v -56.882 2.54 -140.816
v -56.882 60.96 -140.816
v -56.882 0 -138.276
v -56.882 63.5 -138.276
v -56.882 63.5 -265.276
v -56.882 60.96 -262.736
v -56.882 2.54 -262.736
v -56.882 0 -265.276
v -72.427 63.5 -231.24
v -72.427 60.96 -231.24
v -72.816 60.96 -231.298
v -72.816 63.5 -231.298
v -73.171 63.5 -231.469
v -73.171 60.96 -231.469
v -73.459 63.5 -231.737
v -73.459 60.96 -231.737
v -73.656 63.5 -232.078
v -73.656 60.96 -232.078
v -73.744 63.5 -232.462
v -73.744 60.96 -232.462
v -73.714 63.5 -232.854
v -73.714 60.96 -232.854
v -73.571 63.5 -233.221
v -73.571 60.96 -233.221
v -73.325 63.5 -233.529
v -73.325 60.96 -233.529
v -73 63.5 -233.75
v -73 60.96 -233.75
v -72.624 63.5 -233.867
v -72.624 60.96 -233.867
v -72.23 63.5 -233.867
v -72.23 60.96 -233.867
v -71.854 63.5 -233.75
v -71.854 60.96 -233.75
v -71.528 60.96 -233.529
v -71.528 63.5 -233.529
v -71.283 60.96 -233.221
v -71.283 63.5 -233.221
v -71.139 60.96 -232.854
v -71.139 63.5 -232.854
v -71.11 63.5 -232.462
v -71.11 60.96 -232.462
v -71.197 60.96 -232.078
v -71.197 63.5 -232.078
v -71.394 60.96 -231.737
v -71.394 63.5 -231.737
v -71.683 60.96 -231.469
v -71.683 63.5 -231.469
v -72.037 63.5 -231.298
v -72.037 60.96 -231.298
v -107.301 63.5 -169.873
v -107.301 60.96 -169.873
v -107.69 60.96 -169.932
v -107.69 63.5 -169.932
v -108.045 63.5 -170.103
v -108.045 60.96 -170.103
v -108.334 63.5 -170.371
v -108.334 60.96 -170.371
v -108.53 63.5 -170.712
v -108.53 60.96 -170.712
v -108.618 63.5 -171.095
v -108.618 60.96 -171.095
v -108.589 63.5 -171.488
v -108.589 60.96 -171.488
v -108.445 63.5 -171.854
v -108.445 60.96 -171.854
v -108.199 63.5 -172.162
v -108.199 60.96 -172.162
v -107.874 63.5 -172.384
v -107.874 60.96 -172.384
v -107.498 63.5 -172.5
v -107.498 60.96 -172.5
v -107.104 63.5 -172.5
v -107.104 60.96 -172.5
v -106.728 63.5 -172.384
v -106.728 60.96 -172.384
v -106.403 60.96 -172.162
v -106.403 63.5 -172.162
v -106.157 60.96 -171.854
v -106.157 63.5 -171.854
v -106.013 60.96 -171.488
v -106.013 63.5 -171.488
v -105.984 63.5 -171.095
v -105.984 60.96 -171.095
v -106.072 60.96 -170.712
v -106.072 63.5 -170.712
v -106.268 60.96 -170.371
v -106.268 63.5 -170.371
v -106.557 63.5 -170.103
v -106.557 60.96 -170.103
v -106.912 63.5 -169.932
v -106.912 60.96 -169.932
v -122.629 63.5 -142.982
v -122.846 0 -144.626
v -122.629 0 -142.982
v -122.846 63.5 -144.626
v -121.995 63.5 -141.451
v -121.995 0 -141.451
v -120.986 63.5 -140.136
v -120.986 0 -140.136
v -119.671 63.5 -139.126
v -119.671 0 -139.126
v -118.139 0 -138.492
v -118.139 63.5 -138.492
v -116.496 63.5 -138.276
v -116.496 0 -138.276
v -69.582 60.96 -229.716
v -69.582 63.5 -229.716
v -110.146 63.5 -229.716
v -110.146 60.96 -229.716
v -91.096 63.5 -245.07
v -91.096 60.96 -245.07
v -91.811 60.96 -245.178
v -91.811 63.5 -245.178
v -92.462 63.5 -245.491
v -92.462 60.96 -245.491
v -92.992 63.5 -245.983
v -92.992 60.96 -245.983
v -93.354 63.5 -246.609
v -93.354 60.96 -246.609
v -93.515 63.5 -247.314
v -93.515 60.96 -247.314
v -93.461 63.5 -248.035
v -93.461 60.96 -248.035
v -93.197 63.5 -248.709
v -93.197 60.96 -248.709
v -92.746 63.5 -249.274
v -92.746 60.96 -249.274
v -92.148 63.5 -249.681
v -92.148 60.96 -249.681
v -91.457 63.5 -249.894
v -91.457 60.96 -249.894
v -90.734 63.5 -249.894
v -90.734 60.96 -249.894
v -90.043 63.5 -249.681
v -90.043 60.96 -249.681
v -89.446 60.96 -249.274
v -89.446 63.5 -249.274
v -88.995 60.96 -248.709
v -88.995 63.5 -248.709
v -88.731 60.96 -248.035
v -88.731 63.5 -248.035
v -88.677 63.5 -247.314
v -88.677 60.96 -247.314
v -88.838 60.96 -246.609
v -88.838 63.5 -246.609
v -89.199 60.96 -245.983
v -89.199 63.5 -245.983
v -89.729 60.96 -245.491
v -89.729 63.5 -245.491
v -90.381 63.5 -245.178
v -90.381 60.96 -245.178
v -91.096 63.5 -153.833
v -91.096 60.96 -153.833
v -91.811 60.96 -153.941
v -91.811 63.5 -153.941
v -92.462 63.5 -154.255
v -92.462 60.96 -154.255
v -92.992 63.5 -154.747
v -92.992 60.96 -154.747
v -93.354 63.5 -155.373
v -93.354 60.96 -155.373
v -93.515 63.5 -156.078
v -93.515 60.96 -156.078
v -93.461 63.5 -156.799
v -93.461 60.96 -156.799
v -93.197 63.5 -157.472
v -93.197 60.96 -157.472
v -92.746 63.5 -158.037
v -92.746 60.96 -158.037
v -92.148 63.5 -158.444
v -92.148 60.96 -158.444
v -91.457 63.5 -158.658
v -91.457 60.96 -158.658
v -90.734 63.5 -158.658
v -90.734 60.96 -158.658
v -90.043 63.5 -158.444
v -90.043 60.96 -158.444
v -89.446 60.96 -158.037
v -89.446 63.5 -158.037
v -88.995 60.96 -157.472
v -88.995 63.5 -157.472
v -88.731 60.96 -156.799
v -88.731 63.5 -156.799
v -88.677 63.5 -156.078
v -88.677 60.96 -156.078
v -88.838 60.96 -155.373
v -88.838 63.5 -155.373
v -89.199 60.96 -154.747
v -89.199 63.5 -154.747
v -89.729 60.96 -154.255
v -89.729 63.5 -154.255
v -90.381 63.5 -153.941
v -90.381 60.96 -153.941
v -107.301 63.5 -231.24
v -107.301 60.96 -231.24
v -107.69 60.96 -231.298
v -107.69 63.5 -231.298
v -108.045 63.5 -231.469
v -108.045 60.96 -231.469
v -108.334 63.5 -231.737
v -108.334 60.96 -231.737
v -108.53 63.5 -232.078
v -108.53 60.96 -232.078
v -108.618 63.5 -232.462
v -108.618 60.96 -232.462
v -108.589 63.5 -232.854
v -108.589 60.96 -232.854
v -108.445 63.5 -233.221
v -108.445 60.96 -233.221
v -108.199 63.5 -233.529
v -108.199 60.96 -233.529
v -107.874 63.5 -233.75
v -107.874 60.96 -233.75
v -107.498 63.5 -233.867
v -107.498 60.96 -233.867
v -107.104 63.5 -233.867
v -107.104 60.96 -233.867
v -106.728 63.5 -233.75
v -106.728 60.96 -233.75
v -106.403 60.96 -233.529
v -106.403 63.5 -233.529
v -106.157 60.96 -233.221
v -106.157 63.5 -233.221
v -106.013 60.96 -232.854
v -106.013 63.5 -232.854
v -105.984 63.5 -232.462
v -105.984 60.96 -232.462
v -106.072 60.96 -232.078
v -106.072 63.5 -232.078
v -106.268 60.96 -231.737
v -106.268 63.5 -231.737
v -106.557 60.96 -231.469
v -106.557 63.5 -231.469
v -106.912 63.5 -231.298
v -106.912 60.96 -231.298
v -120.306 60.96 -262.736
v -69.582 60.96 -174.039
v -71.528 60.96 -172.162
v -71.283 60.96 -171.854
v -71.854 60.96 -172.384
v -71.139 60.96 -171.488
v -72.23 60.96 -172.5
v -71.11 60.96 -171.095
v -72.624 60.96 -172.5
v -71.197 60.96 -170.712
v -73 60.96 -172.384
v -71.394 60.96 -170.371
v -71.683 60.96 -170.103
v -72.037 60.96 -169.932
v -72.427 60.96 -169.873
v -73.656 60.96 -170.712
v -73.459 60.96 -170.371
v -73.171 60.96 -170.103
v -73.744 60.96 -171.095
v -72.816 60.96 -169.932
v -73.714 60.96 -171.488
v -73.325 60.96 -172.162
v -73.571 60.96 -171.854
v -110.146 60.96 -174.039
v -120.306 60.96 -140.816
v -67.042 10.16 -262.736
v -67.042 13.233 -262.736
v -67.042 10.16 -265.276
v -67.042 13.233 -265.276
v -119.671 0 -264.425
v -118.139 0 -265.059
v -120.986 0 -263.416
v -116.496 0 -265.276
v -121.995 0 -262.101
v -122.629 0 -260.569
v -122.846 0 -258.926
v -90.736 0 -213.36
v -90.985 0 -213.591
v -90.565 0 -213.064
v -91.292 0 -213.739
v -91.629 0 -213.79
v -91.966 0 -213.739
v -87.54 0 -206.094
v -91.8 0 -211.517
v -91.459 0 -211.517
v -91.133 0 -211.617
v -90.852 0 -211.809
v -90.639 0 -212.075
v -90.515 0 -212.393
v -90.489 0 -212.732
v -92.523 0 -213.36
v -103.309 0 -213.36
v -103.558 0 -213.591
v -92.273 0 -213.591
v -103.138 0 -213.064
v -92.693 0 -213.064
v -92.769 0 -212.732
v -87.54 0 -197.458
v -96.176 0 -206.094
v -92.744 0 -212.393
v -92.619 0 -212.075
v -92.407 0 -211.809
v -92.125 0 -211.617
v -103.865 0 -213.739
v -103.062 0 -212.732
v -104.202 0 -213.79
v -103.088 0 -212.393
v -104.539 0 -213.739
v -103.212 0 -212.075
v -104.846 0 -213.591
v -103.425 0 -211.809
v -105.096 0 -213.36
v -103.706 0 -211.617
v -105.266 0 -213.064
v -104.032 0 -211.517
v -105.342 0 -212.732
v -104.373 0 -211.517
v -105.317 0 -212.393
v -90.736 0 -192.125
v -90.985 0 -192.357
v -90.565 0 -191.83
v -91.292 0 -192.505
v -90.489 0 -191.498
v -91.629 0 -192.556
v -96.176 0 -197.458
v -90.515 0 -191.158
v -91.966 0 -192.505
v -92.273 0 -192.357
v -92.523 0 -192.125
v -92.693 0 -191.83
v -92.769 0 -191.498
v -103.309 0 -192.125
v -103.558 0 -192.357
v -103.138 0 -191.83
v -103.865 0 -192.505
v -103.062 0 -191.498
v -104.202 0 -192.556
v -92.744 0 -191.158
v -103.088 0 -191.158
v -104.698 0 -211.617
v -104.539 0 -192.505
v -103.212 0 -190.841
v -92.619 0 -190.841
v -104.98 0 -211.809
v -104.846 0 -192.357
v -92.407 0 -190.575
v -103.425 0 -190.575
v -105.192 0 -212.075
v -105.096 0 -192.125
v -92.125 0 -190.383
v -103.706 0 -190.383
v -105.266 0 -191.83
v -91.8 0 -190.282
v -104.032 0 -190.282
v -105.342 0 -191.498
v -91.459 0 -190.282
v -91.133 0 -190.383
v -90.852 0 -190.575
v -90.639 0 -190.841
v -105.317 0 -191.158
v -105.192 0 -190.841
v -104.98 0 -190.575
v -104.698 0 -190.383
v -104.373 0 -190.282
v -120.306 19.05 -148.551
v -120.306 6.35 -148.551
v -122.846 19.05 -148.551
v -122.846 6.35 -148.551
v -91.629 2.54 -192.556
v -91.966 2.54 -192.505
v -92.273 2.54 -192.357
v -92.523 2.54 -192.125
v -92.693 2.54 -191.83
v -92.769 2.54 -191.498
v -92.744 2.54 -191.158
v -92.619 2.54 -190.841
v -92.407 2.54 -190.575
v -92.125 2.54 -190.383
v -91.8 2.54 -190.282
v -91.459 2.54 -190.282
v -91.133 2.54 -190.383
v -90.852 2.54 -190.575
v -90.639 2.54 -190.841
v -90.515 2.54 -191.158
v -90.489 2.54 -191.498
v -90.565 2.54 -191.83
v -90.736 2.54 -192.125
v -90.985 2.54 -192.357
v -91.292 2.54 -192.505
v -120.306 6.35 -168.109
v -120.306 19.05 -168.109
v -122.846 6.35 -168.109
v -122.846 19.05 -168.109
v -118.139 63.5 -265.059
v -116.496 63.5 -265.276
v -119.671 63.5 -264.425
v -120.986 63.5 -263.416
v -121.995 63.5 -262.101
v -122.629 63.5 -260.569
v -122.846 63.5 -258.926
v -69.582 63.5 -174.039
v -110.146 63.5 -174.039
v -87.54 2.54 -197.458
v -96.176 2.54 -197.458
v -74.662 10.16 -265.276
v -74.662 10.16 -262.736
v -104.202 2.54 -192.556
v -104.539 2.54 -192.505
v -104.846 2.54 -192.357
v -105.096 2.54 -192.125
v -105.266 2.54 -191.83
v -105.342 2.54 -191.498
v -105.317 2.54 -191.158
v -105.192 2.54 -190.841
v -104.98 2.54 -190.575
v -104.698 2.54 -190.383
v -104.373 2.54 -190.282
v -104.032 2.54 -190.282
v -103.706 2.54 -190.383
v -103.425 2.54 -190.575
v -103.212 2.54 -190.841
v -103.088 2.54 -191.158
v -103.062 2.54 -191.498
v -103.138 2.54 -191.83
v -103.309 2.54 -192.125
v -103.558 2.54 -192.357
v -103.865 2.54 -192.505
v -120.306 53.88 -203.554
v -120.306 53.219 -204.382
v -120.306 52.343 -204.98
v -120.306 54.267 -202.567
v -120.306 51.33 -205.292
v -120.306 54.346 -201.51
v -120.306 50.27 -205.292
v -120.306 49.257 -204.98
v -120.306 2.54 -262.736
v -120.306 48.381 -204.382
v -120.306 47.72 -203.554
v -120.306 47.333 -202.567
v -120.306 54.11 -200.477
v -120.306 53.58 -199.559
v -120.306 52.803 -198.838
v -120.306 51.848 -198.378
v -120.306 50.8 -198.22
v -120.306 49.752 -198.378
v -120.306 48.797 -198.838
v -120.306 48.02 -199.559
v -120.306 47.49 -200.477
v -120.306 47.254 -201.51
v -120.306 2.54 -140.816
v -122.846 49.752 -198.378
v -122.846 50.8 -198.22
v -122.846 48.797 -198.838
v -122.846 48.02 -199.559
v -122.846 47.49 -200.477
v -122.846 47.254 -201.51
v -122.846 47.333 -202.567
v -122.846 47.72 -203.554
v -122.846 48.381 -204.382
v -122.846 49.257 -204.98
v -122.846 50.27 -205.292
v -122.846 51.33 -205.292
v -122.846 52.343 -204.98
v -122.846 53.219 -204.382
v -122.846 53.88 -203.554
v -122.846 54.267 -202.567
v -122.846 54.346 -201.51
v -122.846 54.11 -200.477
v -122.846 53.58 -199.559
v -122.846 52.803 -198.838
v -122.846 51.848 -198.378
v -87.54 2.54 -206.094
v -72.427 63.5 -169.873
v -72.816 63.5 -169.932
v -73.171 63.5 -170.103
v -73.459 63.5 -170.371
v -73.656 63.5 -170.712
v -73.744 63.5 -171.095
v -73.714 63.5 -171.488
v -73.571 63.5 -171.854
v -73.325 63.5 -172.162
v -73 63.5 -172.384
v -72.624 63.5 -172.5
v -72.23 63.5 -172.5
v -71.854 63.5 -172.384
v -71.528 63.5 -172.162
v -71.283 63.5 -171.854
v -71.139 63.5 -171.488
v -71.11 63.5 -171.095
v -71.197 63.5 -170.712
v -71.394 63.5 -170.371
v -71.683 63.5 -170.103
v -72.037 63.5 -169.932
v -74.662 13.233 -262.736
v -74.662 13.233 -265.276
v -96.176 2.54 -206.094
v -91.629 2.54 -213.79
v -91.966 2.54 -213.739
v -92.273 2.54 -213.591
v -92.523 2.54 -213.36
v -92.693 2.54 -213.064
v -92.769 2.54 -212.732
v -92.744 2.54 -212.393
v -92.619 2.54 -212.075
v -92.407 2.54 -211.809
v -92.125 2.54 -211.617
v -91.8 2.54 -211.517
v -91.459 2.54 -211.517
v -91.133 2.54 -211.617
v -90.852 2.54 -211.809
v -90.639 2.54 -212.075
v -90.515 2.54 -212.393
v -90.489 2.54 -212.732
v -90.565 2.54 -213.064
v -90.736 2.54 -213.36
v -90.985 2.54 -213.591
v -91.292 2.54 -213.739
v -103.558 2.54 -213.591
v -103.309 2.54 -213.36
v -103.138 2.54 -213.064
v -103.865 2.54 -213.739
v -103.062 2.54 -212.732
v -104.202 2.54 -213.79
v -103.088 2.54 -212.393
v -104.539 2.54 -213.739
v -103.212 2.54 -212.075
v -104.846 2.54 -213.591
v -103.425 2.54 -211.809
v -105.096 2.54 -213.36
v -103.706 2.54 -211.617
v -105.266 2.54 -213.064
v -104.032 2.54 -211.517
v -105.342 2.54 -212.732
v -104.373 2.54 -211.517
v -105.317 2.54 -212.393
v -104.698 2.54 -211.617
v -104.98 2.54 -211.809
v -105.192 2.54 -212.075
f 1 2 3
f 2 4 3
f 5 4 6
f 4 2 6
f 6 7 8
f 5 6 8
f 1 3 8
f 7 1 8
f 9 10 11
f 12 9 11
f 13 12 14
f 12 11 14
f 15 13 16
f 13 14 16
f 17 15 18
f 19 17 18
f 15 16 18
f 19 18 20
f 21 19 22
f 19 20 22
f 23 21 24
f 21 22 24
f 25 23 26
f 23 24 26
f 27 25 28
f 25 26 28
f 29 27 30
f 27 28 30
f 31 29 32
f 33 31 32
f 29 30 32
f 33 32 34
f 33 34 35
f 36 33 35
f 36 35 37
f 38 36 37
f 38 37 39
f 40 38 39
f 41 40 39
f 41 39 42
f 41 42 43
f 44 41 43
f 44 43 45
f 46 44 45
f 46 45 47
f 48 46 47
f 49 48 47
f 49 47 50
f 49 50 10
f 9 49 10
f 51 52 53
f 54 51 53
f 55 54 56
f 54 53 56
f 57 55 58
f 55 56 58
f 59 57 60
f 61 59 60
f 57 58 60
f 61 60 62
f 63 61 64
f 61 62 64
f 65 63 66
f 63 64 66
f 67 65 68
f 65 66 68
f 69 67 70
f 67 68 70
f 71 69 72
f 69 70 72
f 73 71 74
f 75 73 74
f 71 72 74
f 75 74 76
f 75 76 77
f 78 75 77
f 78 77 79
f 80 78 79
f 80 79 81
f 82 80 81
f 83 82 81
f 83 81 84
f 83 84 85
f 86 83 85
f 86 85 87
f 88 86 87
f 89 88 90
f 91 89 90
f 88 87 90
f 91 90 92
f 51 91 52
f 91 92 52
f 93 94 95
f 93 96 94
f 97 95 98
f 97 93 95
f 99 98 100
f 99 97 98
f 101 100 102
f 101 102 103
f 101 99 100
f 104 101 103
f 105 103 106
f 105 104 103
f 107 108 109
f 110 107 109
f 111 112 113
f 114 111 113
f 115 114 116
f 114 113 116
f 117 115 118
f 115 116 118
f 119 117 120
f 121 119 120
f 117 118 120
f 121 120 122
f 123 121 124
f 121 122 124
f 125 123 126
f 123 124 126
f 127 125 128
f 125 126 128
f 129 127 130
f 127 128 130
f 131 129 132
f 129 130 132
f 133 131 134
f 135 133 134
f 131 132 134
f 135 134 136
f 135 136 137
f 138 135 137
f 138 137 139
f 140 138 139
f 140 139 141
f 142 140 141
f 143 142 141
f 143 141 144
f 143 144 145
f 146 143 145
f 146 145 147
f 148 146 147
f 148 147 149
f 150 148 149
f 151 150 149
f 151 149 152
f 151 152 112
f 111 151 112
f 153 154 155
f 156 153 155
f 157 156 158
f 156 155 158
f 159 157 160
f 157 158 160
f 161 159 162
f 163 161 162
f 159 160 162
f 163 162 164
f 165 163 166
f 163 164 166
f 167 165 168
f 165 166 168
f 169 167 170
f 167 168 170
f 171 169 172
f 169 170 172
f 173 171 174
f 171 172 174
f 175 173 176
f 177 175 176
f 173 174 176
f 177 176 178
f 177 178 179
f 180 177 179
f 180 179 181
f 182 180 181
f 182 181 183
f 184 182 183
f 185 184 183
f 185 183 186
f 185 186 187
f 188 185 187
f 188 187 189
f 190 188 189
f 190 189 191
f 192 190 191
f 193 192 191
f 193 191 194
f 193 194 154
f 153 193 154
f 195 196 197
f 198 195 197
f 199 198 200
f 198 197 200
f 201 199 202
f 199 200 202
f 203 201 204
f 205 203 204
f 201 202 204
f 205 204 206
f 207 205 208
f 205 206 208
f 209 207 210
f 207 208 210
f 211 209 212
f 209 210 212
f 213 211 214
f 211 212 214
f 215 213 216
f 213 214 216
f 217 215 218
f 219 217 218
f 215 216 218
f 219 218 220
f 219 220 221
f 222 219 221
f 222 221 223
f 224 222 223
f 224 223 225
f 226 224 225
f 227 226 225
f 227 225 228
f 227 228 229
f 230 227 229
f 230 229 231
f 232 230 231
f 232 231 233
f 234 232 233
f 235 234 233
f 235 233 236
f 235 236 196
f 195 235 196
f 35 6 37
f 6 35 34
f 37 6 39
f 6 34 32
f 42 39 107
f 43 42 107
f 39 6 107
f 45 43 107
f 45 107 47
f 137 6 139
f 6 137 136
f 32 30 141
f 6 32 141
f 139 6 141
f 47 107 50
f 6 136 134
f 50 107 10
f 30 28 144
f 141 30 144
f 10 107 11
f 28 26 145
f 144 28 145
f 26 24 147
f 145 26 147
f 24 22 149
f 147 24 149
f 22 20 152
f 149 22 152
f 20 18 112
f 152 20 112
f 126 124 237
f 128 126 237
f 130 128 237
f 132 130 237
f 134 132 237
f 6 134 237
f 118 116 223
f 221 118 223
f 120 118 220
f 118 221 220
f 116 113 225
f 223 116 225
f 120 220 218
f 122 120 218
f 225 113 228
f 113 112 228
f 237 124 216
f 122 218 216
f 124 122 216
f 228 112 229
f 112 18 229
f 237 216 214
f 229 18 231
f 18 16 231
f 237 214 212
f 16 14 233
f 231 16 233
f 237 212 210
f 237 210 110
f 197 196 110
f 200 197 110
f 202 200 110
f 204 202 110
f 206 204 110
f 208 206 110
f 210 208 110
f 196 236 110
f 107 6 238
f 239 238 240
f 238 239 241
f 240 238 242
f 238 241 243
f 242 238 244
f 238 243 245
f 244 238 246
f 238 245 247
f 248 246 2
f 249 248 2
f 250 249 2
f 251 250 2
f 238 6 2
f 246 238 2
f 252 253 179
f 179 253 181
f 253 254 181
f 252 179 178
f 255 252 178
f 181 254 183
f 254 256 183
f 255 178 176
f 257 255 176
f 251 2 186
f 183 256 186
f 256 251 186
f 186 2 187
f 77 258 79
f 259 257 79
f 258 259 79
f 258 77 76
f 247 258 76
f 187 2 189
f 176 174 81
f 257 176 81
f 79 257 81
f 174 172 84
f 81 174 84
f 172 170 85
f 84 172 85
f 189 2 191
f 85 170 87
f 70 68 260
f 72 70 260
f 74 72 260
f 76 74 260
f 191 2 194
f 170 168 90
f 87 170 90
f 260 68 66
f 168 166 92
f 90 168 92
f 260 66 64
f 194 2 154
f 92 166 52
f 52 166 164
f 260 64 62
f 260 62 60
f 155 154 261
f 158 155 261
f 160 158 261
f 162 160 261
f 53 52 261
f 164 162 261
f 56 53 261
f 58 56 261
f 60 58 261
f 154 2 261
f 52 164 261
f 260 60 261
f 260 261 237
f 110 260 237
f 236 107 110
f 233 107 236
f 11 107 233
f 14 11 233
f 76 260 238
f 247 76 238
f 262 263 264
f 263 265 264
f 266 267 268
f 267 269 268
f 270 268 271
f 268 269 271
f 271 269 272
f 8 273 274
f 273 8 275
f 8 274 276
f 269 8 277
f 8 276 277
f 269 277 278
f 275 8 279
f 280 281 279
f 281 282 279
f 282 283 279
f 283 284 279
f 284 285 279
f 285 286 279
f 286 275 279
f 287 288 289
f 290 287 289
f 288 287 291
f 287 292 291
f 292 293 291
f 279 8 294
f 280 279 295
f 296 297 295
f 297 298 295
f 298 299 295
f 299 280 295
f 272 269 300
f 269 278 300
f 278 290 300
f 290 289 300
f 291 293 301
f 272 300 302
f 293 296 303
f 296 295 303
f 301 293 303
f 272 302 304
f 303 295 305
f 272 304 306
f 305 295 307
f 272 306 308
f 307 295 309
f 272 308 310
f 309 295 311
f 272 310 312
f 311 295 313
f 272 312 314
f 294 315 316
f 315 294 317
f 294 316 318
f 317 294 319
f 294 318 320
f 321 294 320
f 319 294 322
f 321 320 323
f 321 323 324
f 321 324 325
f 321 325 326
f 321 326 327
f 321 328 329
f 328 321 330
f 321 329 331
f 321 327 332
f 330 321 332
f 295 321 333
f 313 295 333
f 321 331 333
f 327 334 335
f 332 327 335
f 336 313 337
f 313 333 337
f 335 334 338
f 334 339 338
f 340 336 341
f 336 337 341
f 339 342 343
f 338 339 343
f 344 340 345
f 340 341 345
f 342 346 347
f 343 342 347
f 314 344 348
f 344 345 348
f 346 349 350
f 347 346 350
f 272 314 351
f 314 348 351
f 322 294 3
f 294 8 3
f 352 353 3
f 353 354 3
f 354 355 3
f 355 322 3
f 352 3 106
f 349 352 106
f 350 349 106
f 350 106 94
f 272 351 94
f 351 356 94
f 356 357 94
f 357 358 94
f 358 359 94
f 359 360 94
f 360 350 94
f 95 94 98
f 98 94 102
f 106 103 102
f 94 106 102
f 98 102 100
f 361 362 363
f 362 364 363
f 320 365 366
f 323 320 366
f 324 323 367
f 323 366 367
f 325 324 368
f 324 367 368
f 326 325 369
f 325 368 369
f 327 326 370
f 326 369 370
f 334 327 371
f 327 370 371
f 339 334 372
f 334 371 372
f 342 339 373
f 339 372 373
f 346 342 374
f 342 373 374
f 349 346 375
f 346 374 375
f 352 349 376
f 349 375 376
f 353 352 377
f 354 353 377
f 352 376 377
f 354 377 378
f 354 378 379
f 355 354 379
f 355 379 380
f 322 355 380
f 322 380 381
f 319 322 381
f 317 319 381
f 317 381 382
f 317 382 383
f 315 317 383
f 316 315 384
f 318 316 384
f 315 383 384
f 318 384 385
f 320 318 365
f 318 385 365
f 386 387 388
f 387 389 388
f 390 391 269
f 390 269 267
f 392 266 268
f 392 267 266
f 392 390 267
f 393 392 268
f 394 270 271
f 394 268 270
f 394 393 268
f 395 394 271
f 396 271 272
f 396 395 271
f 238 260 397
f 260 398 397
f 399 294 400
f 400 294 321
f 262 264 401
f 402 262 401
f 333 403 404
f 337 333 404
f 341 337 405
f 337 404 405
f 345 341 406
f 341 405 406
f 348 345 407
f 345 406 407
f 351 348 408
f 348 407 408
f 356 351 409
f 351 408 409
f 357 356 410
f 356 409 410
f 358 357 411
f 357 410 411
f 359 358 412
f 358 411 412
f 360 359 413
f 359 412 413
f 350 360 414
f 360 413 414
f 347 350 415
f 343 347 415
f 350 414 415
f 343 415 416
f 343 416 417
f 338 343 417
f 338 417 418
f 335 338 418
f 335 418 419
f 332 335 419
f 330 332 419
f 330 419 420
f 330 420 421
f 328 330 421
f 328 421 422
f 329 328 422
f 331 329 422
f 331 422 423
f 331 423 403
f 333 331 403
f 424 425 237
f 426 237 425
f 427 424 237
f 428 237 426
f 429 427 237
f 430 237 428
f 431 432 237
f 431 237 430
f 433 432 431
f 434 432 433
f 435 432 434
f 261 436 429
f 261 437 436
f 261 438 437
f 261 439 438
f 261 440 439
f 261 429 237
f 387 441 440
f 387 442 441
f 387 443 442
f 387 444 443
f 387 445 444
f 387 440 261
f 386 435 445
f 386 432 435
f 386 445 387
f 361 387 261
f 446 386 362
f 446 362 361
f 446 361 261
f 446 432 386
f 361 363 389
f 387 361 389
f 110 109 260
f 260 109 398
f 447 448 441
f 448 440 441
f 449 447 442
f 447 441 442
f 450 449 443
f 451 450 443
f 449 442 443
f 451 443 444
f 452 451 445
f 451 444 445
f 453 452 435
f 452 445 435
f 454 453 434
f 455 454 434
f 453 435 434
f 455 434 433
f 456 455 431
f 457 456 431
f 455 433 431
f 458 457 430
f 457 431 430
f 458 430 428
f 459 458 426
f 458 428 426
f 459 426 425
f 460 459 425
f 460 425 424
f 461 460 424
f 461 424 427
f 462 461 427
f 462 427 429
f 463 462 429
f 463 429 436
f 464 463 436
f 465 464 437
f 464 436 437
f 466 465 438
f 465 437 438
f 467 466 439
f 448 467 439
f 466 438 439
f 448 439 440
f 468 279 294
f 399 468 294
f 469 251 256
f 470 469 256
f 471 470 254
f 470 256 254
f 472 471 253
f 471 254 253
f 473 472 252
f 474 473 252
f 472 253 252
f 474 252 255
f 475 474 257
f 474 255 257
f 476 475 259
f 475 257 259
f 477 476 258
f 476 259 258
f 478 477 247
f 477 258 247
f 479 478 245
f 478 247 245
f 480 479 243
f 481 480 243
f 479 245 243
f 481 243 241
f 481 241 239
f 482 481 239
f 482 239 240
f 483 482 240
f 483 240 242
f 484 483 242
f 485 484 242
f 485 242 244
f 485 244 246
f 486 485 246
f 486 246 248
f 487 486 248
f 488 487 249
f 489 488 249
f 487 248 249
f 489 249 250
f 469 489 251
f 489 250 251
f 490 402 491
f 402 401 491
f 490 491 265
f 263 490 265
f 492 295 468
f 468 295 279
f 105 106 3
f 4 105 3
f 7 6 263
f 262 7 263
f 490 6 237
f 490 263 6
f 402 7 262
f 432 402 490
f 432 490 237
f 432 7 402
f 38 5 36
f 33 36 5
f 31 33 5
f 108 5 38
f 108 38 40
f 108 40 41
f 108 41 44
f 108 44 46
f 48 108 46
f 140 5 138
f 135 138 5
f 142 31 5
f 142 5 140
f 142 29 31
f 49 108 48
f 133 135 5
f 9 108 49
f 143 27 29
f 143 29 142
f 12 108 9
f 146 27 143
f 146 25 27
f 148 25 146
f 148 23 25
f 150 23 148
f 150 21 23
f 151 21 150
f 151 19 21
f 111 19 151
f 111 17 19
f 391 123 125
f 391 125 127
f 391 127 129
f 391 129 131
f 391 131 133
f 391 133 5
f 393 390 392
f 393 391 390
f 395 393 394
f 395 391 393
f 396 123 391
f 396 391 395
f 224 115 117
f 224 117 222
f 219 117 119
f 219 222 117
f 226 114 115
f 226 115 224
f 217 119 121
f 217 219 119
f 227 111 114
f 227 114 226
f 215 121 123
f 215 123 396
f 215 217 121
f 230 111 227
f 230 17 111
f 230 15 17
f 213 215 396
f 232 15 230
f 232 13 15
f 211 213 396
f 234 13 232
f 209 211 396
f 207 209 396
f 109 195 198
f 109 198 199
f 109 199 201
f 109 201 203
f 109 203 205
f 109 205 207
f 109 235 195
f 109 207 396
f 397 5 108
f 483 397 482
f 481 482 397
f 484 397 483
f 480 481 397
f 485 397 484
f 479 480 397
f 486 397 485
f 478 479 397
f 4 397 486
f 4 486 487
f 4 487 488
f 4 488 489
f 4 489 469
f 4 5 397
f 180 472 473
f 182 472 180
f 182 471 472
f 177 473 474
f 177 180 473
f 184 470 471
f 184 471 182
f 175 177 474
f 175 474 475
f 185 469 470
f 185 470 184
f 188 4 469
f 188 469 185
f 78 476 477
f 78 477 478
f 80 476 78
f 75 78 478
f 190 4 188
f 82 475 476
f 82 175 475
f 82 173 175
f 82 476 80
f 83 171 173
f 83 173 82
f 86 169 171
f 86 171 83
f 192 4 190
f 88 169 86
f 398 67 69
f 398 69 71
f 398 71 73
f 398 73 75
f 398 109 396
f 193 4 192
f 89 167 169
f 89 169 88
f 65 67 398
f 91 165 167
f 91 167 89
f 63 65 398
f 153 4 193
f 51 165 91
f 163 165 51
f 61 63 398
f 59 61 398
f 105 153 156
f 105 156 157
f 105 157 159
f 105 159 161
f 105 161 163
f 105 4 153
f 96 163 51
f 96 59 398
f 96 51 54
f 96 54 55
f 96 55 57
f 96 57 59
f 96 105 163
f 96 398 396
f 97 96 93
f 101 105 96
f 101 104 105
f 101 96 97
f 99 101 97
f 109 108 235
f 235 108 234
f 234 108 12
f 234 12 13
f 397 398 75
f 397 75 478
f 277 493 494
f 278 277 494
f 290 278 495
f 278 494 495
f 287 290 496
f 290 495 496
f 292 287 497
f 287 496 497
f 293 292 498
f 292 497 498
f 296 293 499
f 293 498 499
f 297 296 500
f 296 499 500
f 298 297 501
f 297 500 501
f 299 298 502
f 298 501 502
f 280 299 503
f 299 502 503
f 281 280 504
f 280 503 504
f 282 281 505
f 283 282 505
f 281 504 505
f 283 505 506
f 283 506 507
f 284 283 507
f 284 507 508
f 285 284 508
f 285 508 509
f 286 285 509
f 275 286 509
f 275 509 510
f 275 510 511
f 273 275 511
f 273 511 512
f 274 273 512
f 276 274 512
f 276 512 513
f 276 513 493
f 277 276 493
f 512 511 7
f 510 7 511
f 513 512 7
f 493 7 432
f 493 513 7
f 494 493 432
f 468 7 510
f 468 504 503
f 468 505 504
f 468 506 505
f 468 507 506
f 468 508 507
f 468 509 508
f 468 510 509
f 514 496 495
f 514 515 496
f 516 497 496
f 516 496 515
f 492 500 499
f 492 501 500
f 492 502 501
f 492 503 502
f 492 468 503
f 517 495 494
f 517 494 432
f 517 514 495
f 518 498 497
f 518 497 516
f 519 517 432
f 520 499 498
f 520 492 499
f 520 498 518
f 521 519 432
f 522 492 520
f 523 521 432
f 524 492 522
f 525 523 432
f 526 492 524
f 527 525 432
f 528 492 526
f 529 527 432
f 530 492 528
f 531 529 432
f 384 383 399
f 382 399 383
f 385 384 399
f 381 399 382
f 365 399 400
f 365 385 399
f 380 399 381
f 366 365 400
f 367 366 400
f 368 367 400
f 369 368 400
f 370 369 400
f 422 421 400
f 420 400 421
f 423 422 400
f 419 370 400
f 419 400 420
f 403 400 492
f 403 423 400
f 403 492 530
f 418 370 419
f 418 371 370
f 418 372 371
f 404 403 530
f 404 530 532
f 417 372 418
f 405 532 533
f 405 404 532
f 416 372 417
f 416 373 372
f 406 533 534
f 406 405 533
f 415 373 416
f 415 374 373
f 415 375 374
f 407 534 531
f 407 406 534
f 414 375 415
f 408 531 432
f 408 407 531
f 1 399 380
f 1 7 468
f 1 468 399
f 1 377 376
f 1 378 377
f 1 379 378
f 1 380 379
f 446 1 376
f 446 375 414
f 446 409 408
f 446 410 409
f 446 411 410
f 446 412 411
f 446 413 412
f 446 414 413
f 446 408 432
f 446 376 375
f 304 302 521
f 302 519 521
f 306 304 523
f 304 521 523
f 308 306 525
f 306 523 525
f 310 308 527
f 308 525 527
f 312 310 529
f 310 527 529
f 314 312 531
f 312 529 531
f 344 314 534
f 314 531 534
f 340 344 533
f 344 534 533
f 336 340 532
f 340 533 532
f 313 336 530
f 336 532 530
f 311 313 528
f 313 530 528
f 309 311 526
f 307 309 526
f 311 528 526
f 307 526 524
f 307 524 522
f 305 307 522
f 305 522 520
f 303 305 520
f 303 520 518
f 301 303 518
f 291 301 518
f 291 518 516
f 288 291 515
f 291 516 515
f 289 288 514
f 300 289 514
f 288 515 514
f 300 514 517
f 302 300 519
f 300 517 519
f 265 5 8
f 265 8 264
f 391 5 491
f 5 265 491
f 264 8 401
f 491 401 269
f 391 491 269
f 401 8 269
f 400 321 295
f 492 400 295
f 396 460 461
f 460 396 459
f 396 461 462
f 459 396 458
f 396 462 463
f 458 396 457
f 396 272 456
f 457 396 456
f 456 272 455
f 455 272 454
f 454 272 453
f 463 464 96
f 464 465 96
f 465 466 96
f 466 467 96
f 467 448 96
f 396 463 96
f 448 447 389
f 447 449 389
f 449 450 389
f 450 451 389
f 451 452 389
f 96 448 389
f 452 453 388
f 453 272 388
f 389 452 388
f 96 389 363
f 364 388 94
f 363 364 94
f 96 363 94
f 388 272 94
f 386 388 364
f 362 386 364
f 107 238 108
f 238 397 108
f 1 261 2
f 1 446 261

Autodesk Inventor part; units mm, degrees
ref_plane "YZ Plane" through (0, 0, 0) normal (1, 0, 0) x (0, 1, 0)
ref_plane "XZ Plane" through (0, 0, 0) normal (0, 1, 0) x (-1, 0, 0)
ref_plane "XY Plane" through (0, 0, 0) normal (0, 0, 1) x (1, 0, 0)
sketch "Sketch1" plane through (0, 0, 0) normal (0, 1, 0) x (-1, 0, 0)
  line L0 (122.8458, -138.2757) -> (56.882, -138.2757)
  line L1 (56.882, -138.2757) -> (56.882, -265.2757)
  line L2 (56.882, -265.2757) -> (122.8458, -265.2757)
  line L3 (122.8458, -265.2757) -> (122.8458, -138.2757)
  line L4 (110.1458, -173.9373) -> (69.582, -173.9373)
  line L5 (69.582, -173.9373) -> (69.582, -229.6141)
  line L6 (69.582, -229.6141) -> (110.1458, -229.6141)
  line L7 (110.1458, -229.6141) -> (110.1458, -173.9373)
  point P0 (0, 0)
  dimension "d1" = 127
  dimension "d4" = 55.6768
  dimension "d5" = 40.5638
  dimension "d6" = 12.7
  dimension "d7" = 35.6616
  dimension "d8" = 12.7
extrude "Extrusion1" add sketch "Sketch1" along normal blind 63.5 contours L3 L2 L1 L0 | L7 L6 L5 L4
shell "Shell1" thickness 2.54 removed faces 1 at (-56.882, 21.1667, -180.609)
sketch "Sketch3" plane through (0, 63.5, 0) normal (0, 1, 0) x (1, 0, 0)
  line L0 (-110.1458, 174.0389) -> (-69.582, 174.0389)
  line L1 (-69.582, 174.0389) -> (-69.582, 229.7157)
  line L2 (-69.582, 229.7157) -> (-110.1458, 229.7157)
  line L3 (-110.1458, 229.7157) -> (-110.1458, 174.0389)
  line L4 (-122.8458, 265.2757) -> (-122.8458, 138.2757) projected
  line L5 (-56.882, 265.2757) -> (-122.8458, 265.2757) projected
  point P0 (0, 0)
  dimension "d14" = 55.6768
  dimension "d15" = 40.5638
  dimension "d16" = 12.7
  dimension "d17" = 35.56
extrude "Extrusion2" cut sketch "Sketch3" against normal blind 12.7
sketch "Sketch4" plane through (0, 63.5, 0) normal (0, 1, 0) x (1, 0, 0)
  circle A0 centre (-91.0958, 156.2589) radius 2.4257
  line L0 (-69.582, 174.0389) -> (-110.1458, 174.0389) projected
  line L1 (-122.8458, 265.2757) -> (-122.8458, 138.2757) projected
  line L2 (-122.8458, 138.2757) -> (-56.882, 138.2757) projected
  line L3 (-69.582, 229.7157) -> (-69.582, 174.0389) projected
  line L4 (-69.582, 174.0389) -> (-110.1458, 174.0389) projected
  line L5 (-110.1458, 174.0389) -> (-110.1458, 229.7157) projected
  line L6 (-110.1458, 229.7157) -> (-69.582, 229.7157) projected
  line L7 (-122.8458, 138.2757) -> (-56.882, 138.2757) projected
  line L8 (-56.882, 138.2757) -> (-56.882, 265.2757) projected
  line L9 (-56.882, 265.2757) -> (-122.8458, 265.2757) projected
  line L10 (-122.8458, 265.2757) -> (-122.8458, 138.2757) projected
  circle A1 centre (-91.0958, 247.4957) radius 2.4257
  point P0 (0, 0)
  dimension "d20" = 4.8514
  dimension "d21" = 17.78
  dimension "d22" = 31.75
  dimension "d23" = 4.8514
  dimension "d24" = 17.78
  dimension "d25" = 31.75
hole "Hole1" at (-91.0958, 63.5, -156.2589) at (-91.0958, 63.5, -247.4957) direction (0, -1, 0) diameter 4.8514 depth 12.7 tip angle 118
sketch "Sketch5" plane through (0, 0, 0) normal (0, -1, 0) x (1, 0, 0)
  line L0 (-122.8458, -265.2757) -> (-122.8458, -138.2757) projected
  line L1 (-122.8458, -138.2757) -> (-56.882, -138.2757) projected
  line L2 (-122.8458, -265.2757) -> (-122.8458, -138.2757) projected
  line L3 (-56.882, -265.2757) -> (-122.8458, -265.2757) projected
  line L4 (-56.882, -138.2757) -> (-56.882, -265.2757) projected
  line L5 (-96.1758, -206.0937) -> (-87.5398, -206.0937)
  line L6 (-87.5398, -206.0937) -> (-87.5398, -197.4577)
  line L7 (-87.5398, -197.4577) -> (-96.1758, -197.4577)
  line L8 (-96.1758, -197.4577) -> (-96.1758, -206.0937)
  circle A0 centre (-91.8578, -191.8951) radius 1.0414
  circle A1 centre (-91.8578, -212.4032) radius 1.0826
  point P0 (0, 0)
  dimension "d33" = 8.636
  dimension "d34" = 8.636
  dimension "d35" = 26.67
  dimension "d36" = 59.182
  dimension "d64" = 2.0828
  dimension "d65" = 5.5626
  dimension "d83" = 127
  dimension "d84" = 8.636
extrude "Extrusion3" cut sketch "Sketch5" against normal blind 12.7 contours L8 L7 L6 L5
sketch "Sketch6" plane through (-122.8458, 0, -265.2757) normal (-1, 0, 0) x (0, 0, 1)
  circle A0 centre (63.5, 50.8) radius 3.556
  line L0 (127, 0) -> (127, 63.5) projected
  line L1 (0, 63.5) -> (127, 63.5) projected
  line L2 (116.7244, 19.05) -> (97.1664, 19.05)
  line L3 (97.1664, 19.05) -> (97.1664, 6.35)
  line L4 (97.1664, 6.35) -> (116.7244, 6.35)
  line L5 (116.7244, 6.35) -> (116.7244, 19.05)
  line L6 (0, 0) -> (127, 0) projected
  point P0 (265.2757, 0)
  dimension "d39" = 7.112
  dimension "d40" = 63.5
  dimension "d41" = 12.7
  dimension "d49" = 12.7
  dimension "d50" = 19.558
  dimension "d51" = 6.35
hole "Hole2" at (-122.8458, 50.8, -201.7757) direction (1, 0, 0) diameter 7.112 depth 12.7 tip angle 118
extrude "Extrusion4" cut sketch "Sketch6" against normal blind 12.7 contours L5 L4 L3 L2
fillet "Fillet1" radius 6.35 2 edges at (-122.8458, 31.75, -265.2757) (-122.8458, 31.75, -138.2757)
sketch "Sketch8" plane through (0, 63.5, 0) normal (0, 1, 0) x (1, 0, 0)
  point P0 (0, 0)
sketch "Sketch9" plane through (0, 63.5, 0) normal (0, 1, 0) x (1, 0, 0)
  point P0 (0, 0)
sketch "Sketch10" plane through (0, 63.5, 0) normal (0, 1, 0) x (1, 0, 0)
  line L0 (-110.1458, 229.7157) -> (-69.582, 229.7157) projected
  line L1 (-110.1458, 174.0389) -> (-110.1458, 229.7157) projected
  line L2 (-69.582, 229.7157) -> (-69.582, 174.0389) projected
  line L3 (-69.582, 174.0389) -> (-110.1458, 174.0389) projected
  point P0 (0, 0)
  point P1 (-107.301, 232.5605)
  point P2 (-72.4268, 232.5605)
  point P3 (-107.301, 171.1941)
  point P4 (-72.4268, 171.1941)
  dimension "d66" = 2.8448
  dimension "d67" = 2.8448
  dimension "d68" = 2.8448
  dimension "d69" = 2.8448
  dimension "d70" = 2.8448
  dimension "d71" = 2.8448
  dimension "d72" = 2.8448
  dimension "d73" = 2.8448
hole "Hole4" at (-72.4268, 63.5, -232.5605) at (-107.301, 63.5, -171.1941) at (-72.4268, 63.5, -171.1941) at (-107.301, 63.5, -232.5605) direction (0, -1, 0) diameter 2.6416 depth 12.7 tip angle 118
sketch "Sketch11" plane through (0, 0, 0) normal (0, -1, 0) x (1, 0, 0)
  line L0 (-106.285, -214.7297) -> (-82.155, -214.7297)
  line L1 (-82.155, -214.7297) -> (-82.155, -189.3297)
  line L2 (-82.155, -189.3297) -> (-106.285, -189.3297)
  line L3 (-106.285, -189.3297) -> (-106.285, -214.7297)
  line L4 (-96.1758, -206.0937) -> (-96.1758, -197.4577) projected
  line L5 (-96.1758, -197.4577) -> (-87.5398, -197.4577) projected
  line L6 (-87.5398, -206.0937) -> (-96.1758, -206.0937) projected
  point P0 (0, 0)
  point P1 (-104.2022, -191.4125)
  point P2 (-104.2022, -212.6469)
  point P3 (-91.6292, -212.6469)
  point P4 (-91.6292, -191.4125)
  dimension "d81" = 24.13
  dimension "d82" = 25.4
  dimension "d85" = 14.0208
  dimension "d87" = 16.764
  dimension "d88" = 2.0828
  dimension "d89" = 2.0828
  dimension "d90" = 2.0828
  dimension "d91" = 2.0828
  dimension "d92" = 2.0828
  dimension "d93" = 2.0828
  dimension "d95" = 12.573
  dimension "d96" = 12.573
hole "Hole5" at (-104.2022, 0, -212.6469) at (-104.2022, 0, -191.4125) at (-91.6292, 0, -191.4125) at (-91.6292, 0, -212.6469) direction (0, 1, 0) diameter 2.286 depth 12.7 tip angle 118
sketch "Sketch14" plane through (-56.882, 0, -265.2757) normal (0, 0, -1) x (-1, 0, 0)
  line L0 (17.78, 13.2334) -> (10.16, 13.2334)
  line L1 (10.16, 13.2334) -> (10.16, 10.16)
  line L2 (10.16, 10.16) -> (17.78, 10.16)
  line L3 (17.78, 10.16) -> (17.78, 13.2334)
  line L4 (0, 2.54) -> (63.4238, 2.54) projected
  line L5 (0, 0) -> (0, 63.5) projected
  point P0 (-56.882, 0)
  dimension "d114" = 7.62
  dimension "d115" = 3.0734
  dimension "d116" = 7.62
  dimension "d117" = 10.16
extrude "Extrusion6" cut sketch "Sketch14" against normal blind 12.7
equation "\"d7\" = -0.5 * d4 + 0.5 * d1"
equation "\"d8\" = d6"
equation "\"d36\" = 0.5 * d83 - 0.5 * d84"
properties part number "maincontrolpackage_third_eye_not_blind"
